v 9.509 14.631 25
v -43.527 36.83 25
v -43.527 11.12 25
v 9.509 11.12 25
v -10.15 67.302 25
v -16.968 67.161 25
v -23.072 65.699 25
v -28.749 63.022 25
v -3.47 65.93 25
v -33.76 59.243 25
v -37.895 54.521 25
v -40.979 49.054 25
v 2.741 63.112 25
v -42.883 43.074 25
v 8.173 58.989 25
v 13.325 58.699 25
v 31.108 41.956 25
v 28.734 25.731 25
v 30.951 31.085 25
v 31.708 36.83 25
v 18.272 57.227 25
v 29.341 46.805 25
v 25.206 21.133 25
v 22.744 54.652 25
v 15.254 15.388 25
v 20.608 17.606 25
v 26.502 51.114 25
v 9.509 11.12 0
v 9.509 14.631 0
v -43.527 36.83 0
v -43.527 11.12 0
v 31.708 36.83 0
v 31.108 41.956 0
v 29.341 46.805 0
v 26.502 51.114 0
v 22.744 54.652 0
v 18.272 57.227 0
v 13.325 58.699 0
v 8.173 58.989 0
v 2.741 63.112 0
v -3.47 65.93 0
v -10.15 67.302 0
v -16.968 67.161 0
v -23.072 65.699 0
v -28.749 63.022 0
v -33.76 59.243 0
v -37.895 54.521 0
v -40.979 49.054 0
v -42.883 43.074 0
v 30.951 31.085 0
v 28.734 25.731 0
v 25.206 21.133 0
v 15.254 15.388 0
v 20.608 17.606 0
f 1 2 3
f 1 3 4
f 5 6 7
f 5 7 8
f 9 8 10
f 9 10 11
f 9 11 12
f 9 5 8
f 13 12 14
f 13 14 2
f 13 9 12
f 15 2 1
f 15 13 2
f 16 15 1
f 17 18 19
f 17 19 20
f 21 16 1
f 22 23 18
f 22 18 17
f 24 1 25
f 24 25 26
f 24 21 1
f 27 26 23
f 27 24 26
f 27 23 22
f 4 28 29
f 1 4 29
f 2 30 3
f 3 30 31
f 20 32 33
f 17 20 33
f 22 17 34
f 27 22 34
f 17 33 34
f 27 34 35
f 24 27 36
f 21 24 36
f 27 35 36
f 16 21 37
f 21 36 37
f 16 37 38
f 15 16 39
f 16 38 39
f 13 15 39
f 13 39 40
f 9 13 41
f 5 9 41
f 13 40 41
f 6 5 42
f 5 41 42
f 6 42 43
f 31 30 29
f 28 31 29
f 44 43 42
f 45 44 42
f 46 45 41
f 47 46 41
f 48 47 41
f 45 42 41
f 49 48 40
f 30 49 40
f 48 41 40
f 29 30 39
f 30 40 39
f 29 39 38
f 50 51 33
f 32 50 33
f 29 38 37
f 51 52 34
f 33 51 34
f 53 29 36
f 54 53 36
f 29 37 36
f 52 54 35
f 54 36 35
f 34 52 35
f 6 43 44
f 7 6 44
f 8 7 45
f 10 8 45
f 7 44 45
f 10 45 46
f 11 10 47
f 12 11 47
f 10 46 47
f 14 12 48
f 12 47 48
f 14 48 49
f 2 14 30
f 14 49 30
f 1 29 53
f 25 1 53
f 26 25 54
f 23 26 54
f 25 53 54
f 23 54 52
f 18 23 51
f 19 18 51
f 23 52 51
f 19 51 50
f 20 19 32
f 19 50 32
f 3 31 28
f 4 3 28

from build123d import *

# Parameters (mm, degrees)
F1_DEPTH = 25


with BuildPart() as f1:
    # F0 (on Top) → F1 (new body)
    with BuildSketch(Plane.XY):
        Polygon((-43.5267875595, 36.8303582072), (-43.5267875595, 11.1199722934), (-31.3423006786, 36.8303582072), align=None)
        with BuildLine():
            Line((-43.5267875595, 36.8303582072), (-31.3423006786, 36.8303582072))
            Line((-31.3423006786, 36.8303582072), (-16.9682625481, 67.1608982694))
            ThreePointArc((-16.9682625481, 67.1608982694), (-35.9487677178, 56.9878438592), (-43.5267875595, 36.8303582072))
        make_face()
        with BuildLine():
            ThreePointArc((8.1727226195, 58.9890034381), (-6.6535791829, 52.0475969983), (-12.689968176, 36.8303582072))
            Line((-12.689968176, 36.8303582072), (9.508928284, 36.8303582072))
            Line((9.508928284, 36.8303582072), (9.508928284, 14.6314617472))
            ThreePointArc((9.508928284, 14.6314617472), (25.2059185058, 21.1333679855), (31.7078247441, 36.8303582072))
            ThreePointArc((31.7078247441, 36.8303582072), (24.7261670751, 52.9928656742), (8.1727226195, 58.9890034381))
        make_face()
        with BuildLine():
            Line((9.508928284, 36.8303582072), (-12.689968176, 36.8303582072))
            ThreePointArc((-12.689968176, 36.8303582072), (-6.1880619377, 21.1333679855), (9.508928284, 14.6314617472))
            Line((9.508928284, 14.6314617472), (9.508928284, 36.8303582072))
        make_face()
        with BuildLine():
            Line((-31.3423006786, 36.8303582072), (-43.5267875595, 11.1199722934))
            Line((-43.5267875595, 11.1199722934), (9.508928284, 11.1199722934))
            Line((9.508928284, 11.1199722934), (9.508928284, 14.6314617472))
            ThreePointArc((9.508928284, 14.6314617472), (-6.1880619377, 21.1333679855), (-12.689968176, 36.8303582072))
            Line((-12.689968176, 36.8303582072), (-31.3423006786, 36.8303582072))
        make_face()
        with BuildLine():
            Line((-16.9682625481, 67.1608982694), (-31.3423006786, 36.8303582072))
            Line((-31.3423006786, 36.8303582072), (-12.689968176, 36.8303582072))
            ThreePointArc((-12.689968176, 36.8303582072), (-6.6535791829, 52.0475969983), (8.1727226195, 58.9890034381))
            ThreePointArc((8.1727226195, 58.9890034381), (-3.4697191171, 65.9301164017), (-16.9682625481, 67.1608982694))
        make_face()
    extrude(amount=F1_DEPTH)


solid = f1.part
